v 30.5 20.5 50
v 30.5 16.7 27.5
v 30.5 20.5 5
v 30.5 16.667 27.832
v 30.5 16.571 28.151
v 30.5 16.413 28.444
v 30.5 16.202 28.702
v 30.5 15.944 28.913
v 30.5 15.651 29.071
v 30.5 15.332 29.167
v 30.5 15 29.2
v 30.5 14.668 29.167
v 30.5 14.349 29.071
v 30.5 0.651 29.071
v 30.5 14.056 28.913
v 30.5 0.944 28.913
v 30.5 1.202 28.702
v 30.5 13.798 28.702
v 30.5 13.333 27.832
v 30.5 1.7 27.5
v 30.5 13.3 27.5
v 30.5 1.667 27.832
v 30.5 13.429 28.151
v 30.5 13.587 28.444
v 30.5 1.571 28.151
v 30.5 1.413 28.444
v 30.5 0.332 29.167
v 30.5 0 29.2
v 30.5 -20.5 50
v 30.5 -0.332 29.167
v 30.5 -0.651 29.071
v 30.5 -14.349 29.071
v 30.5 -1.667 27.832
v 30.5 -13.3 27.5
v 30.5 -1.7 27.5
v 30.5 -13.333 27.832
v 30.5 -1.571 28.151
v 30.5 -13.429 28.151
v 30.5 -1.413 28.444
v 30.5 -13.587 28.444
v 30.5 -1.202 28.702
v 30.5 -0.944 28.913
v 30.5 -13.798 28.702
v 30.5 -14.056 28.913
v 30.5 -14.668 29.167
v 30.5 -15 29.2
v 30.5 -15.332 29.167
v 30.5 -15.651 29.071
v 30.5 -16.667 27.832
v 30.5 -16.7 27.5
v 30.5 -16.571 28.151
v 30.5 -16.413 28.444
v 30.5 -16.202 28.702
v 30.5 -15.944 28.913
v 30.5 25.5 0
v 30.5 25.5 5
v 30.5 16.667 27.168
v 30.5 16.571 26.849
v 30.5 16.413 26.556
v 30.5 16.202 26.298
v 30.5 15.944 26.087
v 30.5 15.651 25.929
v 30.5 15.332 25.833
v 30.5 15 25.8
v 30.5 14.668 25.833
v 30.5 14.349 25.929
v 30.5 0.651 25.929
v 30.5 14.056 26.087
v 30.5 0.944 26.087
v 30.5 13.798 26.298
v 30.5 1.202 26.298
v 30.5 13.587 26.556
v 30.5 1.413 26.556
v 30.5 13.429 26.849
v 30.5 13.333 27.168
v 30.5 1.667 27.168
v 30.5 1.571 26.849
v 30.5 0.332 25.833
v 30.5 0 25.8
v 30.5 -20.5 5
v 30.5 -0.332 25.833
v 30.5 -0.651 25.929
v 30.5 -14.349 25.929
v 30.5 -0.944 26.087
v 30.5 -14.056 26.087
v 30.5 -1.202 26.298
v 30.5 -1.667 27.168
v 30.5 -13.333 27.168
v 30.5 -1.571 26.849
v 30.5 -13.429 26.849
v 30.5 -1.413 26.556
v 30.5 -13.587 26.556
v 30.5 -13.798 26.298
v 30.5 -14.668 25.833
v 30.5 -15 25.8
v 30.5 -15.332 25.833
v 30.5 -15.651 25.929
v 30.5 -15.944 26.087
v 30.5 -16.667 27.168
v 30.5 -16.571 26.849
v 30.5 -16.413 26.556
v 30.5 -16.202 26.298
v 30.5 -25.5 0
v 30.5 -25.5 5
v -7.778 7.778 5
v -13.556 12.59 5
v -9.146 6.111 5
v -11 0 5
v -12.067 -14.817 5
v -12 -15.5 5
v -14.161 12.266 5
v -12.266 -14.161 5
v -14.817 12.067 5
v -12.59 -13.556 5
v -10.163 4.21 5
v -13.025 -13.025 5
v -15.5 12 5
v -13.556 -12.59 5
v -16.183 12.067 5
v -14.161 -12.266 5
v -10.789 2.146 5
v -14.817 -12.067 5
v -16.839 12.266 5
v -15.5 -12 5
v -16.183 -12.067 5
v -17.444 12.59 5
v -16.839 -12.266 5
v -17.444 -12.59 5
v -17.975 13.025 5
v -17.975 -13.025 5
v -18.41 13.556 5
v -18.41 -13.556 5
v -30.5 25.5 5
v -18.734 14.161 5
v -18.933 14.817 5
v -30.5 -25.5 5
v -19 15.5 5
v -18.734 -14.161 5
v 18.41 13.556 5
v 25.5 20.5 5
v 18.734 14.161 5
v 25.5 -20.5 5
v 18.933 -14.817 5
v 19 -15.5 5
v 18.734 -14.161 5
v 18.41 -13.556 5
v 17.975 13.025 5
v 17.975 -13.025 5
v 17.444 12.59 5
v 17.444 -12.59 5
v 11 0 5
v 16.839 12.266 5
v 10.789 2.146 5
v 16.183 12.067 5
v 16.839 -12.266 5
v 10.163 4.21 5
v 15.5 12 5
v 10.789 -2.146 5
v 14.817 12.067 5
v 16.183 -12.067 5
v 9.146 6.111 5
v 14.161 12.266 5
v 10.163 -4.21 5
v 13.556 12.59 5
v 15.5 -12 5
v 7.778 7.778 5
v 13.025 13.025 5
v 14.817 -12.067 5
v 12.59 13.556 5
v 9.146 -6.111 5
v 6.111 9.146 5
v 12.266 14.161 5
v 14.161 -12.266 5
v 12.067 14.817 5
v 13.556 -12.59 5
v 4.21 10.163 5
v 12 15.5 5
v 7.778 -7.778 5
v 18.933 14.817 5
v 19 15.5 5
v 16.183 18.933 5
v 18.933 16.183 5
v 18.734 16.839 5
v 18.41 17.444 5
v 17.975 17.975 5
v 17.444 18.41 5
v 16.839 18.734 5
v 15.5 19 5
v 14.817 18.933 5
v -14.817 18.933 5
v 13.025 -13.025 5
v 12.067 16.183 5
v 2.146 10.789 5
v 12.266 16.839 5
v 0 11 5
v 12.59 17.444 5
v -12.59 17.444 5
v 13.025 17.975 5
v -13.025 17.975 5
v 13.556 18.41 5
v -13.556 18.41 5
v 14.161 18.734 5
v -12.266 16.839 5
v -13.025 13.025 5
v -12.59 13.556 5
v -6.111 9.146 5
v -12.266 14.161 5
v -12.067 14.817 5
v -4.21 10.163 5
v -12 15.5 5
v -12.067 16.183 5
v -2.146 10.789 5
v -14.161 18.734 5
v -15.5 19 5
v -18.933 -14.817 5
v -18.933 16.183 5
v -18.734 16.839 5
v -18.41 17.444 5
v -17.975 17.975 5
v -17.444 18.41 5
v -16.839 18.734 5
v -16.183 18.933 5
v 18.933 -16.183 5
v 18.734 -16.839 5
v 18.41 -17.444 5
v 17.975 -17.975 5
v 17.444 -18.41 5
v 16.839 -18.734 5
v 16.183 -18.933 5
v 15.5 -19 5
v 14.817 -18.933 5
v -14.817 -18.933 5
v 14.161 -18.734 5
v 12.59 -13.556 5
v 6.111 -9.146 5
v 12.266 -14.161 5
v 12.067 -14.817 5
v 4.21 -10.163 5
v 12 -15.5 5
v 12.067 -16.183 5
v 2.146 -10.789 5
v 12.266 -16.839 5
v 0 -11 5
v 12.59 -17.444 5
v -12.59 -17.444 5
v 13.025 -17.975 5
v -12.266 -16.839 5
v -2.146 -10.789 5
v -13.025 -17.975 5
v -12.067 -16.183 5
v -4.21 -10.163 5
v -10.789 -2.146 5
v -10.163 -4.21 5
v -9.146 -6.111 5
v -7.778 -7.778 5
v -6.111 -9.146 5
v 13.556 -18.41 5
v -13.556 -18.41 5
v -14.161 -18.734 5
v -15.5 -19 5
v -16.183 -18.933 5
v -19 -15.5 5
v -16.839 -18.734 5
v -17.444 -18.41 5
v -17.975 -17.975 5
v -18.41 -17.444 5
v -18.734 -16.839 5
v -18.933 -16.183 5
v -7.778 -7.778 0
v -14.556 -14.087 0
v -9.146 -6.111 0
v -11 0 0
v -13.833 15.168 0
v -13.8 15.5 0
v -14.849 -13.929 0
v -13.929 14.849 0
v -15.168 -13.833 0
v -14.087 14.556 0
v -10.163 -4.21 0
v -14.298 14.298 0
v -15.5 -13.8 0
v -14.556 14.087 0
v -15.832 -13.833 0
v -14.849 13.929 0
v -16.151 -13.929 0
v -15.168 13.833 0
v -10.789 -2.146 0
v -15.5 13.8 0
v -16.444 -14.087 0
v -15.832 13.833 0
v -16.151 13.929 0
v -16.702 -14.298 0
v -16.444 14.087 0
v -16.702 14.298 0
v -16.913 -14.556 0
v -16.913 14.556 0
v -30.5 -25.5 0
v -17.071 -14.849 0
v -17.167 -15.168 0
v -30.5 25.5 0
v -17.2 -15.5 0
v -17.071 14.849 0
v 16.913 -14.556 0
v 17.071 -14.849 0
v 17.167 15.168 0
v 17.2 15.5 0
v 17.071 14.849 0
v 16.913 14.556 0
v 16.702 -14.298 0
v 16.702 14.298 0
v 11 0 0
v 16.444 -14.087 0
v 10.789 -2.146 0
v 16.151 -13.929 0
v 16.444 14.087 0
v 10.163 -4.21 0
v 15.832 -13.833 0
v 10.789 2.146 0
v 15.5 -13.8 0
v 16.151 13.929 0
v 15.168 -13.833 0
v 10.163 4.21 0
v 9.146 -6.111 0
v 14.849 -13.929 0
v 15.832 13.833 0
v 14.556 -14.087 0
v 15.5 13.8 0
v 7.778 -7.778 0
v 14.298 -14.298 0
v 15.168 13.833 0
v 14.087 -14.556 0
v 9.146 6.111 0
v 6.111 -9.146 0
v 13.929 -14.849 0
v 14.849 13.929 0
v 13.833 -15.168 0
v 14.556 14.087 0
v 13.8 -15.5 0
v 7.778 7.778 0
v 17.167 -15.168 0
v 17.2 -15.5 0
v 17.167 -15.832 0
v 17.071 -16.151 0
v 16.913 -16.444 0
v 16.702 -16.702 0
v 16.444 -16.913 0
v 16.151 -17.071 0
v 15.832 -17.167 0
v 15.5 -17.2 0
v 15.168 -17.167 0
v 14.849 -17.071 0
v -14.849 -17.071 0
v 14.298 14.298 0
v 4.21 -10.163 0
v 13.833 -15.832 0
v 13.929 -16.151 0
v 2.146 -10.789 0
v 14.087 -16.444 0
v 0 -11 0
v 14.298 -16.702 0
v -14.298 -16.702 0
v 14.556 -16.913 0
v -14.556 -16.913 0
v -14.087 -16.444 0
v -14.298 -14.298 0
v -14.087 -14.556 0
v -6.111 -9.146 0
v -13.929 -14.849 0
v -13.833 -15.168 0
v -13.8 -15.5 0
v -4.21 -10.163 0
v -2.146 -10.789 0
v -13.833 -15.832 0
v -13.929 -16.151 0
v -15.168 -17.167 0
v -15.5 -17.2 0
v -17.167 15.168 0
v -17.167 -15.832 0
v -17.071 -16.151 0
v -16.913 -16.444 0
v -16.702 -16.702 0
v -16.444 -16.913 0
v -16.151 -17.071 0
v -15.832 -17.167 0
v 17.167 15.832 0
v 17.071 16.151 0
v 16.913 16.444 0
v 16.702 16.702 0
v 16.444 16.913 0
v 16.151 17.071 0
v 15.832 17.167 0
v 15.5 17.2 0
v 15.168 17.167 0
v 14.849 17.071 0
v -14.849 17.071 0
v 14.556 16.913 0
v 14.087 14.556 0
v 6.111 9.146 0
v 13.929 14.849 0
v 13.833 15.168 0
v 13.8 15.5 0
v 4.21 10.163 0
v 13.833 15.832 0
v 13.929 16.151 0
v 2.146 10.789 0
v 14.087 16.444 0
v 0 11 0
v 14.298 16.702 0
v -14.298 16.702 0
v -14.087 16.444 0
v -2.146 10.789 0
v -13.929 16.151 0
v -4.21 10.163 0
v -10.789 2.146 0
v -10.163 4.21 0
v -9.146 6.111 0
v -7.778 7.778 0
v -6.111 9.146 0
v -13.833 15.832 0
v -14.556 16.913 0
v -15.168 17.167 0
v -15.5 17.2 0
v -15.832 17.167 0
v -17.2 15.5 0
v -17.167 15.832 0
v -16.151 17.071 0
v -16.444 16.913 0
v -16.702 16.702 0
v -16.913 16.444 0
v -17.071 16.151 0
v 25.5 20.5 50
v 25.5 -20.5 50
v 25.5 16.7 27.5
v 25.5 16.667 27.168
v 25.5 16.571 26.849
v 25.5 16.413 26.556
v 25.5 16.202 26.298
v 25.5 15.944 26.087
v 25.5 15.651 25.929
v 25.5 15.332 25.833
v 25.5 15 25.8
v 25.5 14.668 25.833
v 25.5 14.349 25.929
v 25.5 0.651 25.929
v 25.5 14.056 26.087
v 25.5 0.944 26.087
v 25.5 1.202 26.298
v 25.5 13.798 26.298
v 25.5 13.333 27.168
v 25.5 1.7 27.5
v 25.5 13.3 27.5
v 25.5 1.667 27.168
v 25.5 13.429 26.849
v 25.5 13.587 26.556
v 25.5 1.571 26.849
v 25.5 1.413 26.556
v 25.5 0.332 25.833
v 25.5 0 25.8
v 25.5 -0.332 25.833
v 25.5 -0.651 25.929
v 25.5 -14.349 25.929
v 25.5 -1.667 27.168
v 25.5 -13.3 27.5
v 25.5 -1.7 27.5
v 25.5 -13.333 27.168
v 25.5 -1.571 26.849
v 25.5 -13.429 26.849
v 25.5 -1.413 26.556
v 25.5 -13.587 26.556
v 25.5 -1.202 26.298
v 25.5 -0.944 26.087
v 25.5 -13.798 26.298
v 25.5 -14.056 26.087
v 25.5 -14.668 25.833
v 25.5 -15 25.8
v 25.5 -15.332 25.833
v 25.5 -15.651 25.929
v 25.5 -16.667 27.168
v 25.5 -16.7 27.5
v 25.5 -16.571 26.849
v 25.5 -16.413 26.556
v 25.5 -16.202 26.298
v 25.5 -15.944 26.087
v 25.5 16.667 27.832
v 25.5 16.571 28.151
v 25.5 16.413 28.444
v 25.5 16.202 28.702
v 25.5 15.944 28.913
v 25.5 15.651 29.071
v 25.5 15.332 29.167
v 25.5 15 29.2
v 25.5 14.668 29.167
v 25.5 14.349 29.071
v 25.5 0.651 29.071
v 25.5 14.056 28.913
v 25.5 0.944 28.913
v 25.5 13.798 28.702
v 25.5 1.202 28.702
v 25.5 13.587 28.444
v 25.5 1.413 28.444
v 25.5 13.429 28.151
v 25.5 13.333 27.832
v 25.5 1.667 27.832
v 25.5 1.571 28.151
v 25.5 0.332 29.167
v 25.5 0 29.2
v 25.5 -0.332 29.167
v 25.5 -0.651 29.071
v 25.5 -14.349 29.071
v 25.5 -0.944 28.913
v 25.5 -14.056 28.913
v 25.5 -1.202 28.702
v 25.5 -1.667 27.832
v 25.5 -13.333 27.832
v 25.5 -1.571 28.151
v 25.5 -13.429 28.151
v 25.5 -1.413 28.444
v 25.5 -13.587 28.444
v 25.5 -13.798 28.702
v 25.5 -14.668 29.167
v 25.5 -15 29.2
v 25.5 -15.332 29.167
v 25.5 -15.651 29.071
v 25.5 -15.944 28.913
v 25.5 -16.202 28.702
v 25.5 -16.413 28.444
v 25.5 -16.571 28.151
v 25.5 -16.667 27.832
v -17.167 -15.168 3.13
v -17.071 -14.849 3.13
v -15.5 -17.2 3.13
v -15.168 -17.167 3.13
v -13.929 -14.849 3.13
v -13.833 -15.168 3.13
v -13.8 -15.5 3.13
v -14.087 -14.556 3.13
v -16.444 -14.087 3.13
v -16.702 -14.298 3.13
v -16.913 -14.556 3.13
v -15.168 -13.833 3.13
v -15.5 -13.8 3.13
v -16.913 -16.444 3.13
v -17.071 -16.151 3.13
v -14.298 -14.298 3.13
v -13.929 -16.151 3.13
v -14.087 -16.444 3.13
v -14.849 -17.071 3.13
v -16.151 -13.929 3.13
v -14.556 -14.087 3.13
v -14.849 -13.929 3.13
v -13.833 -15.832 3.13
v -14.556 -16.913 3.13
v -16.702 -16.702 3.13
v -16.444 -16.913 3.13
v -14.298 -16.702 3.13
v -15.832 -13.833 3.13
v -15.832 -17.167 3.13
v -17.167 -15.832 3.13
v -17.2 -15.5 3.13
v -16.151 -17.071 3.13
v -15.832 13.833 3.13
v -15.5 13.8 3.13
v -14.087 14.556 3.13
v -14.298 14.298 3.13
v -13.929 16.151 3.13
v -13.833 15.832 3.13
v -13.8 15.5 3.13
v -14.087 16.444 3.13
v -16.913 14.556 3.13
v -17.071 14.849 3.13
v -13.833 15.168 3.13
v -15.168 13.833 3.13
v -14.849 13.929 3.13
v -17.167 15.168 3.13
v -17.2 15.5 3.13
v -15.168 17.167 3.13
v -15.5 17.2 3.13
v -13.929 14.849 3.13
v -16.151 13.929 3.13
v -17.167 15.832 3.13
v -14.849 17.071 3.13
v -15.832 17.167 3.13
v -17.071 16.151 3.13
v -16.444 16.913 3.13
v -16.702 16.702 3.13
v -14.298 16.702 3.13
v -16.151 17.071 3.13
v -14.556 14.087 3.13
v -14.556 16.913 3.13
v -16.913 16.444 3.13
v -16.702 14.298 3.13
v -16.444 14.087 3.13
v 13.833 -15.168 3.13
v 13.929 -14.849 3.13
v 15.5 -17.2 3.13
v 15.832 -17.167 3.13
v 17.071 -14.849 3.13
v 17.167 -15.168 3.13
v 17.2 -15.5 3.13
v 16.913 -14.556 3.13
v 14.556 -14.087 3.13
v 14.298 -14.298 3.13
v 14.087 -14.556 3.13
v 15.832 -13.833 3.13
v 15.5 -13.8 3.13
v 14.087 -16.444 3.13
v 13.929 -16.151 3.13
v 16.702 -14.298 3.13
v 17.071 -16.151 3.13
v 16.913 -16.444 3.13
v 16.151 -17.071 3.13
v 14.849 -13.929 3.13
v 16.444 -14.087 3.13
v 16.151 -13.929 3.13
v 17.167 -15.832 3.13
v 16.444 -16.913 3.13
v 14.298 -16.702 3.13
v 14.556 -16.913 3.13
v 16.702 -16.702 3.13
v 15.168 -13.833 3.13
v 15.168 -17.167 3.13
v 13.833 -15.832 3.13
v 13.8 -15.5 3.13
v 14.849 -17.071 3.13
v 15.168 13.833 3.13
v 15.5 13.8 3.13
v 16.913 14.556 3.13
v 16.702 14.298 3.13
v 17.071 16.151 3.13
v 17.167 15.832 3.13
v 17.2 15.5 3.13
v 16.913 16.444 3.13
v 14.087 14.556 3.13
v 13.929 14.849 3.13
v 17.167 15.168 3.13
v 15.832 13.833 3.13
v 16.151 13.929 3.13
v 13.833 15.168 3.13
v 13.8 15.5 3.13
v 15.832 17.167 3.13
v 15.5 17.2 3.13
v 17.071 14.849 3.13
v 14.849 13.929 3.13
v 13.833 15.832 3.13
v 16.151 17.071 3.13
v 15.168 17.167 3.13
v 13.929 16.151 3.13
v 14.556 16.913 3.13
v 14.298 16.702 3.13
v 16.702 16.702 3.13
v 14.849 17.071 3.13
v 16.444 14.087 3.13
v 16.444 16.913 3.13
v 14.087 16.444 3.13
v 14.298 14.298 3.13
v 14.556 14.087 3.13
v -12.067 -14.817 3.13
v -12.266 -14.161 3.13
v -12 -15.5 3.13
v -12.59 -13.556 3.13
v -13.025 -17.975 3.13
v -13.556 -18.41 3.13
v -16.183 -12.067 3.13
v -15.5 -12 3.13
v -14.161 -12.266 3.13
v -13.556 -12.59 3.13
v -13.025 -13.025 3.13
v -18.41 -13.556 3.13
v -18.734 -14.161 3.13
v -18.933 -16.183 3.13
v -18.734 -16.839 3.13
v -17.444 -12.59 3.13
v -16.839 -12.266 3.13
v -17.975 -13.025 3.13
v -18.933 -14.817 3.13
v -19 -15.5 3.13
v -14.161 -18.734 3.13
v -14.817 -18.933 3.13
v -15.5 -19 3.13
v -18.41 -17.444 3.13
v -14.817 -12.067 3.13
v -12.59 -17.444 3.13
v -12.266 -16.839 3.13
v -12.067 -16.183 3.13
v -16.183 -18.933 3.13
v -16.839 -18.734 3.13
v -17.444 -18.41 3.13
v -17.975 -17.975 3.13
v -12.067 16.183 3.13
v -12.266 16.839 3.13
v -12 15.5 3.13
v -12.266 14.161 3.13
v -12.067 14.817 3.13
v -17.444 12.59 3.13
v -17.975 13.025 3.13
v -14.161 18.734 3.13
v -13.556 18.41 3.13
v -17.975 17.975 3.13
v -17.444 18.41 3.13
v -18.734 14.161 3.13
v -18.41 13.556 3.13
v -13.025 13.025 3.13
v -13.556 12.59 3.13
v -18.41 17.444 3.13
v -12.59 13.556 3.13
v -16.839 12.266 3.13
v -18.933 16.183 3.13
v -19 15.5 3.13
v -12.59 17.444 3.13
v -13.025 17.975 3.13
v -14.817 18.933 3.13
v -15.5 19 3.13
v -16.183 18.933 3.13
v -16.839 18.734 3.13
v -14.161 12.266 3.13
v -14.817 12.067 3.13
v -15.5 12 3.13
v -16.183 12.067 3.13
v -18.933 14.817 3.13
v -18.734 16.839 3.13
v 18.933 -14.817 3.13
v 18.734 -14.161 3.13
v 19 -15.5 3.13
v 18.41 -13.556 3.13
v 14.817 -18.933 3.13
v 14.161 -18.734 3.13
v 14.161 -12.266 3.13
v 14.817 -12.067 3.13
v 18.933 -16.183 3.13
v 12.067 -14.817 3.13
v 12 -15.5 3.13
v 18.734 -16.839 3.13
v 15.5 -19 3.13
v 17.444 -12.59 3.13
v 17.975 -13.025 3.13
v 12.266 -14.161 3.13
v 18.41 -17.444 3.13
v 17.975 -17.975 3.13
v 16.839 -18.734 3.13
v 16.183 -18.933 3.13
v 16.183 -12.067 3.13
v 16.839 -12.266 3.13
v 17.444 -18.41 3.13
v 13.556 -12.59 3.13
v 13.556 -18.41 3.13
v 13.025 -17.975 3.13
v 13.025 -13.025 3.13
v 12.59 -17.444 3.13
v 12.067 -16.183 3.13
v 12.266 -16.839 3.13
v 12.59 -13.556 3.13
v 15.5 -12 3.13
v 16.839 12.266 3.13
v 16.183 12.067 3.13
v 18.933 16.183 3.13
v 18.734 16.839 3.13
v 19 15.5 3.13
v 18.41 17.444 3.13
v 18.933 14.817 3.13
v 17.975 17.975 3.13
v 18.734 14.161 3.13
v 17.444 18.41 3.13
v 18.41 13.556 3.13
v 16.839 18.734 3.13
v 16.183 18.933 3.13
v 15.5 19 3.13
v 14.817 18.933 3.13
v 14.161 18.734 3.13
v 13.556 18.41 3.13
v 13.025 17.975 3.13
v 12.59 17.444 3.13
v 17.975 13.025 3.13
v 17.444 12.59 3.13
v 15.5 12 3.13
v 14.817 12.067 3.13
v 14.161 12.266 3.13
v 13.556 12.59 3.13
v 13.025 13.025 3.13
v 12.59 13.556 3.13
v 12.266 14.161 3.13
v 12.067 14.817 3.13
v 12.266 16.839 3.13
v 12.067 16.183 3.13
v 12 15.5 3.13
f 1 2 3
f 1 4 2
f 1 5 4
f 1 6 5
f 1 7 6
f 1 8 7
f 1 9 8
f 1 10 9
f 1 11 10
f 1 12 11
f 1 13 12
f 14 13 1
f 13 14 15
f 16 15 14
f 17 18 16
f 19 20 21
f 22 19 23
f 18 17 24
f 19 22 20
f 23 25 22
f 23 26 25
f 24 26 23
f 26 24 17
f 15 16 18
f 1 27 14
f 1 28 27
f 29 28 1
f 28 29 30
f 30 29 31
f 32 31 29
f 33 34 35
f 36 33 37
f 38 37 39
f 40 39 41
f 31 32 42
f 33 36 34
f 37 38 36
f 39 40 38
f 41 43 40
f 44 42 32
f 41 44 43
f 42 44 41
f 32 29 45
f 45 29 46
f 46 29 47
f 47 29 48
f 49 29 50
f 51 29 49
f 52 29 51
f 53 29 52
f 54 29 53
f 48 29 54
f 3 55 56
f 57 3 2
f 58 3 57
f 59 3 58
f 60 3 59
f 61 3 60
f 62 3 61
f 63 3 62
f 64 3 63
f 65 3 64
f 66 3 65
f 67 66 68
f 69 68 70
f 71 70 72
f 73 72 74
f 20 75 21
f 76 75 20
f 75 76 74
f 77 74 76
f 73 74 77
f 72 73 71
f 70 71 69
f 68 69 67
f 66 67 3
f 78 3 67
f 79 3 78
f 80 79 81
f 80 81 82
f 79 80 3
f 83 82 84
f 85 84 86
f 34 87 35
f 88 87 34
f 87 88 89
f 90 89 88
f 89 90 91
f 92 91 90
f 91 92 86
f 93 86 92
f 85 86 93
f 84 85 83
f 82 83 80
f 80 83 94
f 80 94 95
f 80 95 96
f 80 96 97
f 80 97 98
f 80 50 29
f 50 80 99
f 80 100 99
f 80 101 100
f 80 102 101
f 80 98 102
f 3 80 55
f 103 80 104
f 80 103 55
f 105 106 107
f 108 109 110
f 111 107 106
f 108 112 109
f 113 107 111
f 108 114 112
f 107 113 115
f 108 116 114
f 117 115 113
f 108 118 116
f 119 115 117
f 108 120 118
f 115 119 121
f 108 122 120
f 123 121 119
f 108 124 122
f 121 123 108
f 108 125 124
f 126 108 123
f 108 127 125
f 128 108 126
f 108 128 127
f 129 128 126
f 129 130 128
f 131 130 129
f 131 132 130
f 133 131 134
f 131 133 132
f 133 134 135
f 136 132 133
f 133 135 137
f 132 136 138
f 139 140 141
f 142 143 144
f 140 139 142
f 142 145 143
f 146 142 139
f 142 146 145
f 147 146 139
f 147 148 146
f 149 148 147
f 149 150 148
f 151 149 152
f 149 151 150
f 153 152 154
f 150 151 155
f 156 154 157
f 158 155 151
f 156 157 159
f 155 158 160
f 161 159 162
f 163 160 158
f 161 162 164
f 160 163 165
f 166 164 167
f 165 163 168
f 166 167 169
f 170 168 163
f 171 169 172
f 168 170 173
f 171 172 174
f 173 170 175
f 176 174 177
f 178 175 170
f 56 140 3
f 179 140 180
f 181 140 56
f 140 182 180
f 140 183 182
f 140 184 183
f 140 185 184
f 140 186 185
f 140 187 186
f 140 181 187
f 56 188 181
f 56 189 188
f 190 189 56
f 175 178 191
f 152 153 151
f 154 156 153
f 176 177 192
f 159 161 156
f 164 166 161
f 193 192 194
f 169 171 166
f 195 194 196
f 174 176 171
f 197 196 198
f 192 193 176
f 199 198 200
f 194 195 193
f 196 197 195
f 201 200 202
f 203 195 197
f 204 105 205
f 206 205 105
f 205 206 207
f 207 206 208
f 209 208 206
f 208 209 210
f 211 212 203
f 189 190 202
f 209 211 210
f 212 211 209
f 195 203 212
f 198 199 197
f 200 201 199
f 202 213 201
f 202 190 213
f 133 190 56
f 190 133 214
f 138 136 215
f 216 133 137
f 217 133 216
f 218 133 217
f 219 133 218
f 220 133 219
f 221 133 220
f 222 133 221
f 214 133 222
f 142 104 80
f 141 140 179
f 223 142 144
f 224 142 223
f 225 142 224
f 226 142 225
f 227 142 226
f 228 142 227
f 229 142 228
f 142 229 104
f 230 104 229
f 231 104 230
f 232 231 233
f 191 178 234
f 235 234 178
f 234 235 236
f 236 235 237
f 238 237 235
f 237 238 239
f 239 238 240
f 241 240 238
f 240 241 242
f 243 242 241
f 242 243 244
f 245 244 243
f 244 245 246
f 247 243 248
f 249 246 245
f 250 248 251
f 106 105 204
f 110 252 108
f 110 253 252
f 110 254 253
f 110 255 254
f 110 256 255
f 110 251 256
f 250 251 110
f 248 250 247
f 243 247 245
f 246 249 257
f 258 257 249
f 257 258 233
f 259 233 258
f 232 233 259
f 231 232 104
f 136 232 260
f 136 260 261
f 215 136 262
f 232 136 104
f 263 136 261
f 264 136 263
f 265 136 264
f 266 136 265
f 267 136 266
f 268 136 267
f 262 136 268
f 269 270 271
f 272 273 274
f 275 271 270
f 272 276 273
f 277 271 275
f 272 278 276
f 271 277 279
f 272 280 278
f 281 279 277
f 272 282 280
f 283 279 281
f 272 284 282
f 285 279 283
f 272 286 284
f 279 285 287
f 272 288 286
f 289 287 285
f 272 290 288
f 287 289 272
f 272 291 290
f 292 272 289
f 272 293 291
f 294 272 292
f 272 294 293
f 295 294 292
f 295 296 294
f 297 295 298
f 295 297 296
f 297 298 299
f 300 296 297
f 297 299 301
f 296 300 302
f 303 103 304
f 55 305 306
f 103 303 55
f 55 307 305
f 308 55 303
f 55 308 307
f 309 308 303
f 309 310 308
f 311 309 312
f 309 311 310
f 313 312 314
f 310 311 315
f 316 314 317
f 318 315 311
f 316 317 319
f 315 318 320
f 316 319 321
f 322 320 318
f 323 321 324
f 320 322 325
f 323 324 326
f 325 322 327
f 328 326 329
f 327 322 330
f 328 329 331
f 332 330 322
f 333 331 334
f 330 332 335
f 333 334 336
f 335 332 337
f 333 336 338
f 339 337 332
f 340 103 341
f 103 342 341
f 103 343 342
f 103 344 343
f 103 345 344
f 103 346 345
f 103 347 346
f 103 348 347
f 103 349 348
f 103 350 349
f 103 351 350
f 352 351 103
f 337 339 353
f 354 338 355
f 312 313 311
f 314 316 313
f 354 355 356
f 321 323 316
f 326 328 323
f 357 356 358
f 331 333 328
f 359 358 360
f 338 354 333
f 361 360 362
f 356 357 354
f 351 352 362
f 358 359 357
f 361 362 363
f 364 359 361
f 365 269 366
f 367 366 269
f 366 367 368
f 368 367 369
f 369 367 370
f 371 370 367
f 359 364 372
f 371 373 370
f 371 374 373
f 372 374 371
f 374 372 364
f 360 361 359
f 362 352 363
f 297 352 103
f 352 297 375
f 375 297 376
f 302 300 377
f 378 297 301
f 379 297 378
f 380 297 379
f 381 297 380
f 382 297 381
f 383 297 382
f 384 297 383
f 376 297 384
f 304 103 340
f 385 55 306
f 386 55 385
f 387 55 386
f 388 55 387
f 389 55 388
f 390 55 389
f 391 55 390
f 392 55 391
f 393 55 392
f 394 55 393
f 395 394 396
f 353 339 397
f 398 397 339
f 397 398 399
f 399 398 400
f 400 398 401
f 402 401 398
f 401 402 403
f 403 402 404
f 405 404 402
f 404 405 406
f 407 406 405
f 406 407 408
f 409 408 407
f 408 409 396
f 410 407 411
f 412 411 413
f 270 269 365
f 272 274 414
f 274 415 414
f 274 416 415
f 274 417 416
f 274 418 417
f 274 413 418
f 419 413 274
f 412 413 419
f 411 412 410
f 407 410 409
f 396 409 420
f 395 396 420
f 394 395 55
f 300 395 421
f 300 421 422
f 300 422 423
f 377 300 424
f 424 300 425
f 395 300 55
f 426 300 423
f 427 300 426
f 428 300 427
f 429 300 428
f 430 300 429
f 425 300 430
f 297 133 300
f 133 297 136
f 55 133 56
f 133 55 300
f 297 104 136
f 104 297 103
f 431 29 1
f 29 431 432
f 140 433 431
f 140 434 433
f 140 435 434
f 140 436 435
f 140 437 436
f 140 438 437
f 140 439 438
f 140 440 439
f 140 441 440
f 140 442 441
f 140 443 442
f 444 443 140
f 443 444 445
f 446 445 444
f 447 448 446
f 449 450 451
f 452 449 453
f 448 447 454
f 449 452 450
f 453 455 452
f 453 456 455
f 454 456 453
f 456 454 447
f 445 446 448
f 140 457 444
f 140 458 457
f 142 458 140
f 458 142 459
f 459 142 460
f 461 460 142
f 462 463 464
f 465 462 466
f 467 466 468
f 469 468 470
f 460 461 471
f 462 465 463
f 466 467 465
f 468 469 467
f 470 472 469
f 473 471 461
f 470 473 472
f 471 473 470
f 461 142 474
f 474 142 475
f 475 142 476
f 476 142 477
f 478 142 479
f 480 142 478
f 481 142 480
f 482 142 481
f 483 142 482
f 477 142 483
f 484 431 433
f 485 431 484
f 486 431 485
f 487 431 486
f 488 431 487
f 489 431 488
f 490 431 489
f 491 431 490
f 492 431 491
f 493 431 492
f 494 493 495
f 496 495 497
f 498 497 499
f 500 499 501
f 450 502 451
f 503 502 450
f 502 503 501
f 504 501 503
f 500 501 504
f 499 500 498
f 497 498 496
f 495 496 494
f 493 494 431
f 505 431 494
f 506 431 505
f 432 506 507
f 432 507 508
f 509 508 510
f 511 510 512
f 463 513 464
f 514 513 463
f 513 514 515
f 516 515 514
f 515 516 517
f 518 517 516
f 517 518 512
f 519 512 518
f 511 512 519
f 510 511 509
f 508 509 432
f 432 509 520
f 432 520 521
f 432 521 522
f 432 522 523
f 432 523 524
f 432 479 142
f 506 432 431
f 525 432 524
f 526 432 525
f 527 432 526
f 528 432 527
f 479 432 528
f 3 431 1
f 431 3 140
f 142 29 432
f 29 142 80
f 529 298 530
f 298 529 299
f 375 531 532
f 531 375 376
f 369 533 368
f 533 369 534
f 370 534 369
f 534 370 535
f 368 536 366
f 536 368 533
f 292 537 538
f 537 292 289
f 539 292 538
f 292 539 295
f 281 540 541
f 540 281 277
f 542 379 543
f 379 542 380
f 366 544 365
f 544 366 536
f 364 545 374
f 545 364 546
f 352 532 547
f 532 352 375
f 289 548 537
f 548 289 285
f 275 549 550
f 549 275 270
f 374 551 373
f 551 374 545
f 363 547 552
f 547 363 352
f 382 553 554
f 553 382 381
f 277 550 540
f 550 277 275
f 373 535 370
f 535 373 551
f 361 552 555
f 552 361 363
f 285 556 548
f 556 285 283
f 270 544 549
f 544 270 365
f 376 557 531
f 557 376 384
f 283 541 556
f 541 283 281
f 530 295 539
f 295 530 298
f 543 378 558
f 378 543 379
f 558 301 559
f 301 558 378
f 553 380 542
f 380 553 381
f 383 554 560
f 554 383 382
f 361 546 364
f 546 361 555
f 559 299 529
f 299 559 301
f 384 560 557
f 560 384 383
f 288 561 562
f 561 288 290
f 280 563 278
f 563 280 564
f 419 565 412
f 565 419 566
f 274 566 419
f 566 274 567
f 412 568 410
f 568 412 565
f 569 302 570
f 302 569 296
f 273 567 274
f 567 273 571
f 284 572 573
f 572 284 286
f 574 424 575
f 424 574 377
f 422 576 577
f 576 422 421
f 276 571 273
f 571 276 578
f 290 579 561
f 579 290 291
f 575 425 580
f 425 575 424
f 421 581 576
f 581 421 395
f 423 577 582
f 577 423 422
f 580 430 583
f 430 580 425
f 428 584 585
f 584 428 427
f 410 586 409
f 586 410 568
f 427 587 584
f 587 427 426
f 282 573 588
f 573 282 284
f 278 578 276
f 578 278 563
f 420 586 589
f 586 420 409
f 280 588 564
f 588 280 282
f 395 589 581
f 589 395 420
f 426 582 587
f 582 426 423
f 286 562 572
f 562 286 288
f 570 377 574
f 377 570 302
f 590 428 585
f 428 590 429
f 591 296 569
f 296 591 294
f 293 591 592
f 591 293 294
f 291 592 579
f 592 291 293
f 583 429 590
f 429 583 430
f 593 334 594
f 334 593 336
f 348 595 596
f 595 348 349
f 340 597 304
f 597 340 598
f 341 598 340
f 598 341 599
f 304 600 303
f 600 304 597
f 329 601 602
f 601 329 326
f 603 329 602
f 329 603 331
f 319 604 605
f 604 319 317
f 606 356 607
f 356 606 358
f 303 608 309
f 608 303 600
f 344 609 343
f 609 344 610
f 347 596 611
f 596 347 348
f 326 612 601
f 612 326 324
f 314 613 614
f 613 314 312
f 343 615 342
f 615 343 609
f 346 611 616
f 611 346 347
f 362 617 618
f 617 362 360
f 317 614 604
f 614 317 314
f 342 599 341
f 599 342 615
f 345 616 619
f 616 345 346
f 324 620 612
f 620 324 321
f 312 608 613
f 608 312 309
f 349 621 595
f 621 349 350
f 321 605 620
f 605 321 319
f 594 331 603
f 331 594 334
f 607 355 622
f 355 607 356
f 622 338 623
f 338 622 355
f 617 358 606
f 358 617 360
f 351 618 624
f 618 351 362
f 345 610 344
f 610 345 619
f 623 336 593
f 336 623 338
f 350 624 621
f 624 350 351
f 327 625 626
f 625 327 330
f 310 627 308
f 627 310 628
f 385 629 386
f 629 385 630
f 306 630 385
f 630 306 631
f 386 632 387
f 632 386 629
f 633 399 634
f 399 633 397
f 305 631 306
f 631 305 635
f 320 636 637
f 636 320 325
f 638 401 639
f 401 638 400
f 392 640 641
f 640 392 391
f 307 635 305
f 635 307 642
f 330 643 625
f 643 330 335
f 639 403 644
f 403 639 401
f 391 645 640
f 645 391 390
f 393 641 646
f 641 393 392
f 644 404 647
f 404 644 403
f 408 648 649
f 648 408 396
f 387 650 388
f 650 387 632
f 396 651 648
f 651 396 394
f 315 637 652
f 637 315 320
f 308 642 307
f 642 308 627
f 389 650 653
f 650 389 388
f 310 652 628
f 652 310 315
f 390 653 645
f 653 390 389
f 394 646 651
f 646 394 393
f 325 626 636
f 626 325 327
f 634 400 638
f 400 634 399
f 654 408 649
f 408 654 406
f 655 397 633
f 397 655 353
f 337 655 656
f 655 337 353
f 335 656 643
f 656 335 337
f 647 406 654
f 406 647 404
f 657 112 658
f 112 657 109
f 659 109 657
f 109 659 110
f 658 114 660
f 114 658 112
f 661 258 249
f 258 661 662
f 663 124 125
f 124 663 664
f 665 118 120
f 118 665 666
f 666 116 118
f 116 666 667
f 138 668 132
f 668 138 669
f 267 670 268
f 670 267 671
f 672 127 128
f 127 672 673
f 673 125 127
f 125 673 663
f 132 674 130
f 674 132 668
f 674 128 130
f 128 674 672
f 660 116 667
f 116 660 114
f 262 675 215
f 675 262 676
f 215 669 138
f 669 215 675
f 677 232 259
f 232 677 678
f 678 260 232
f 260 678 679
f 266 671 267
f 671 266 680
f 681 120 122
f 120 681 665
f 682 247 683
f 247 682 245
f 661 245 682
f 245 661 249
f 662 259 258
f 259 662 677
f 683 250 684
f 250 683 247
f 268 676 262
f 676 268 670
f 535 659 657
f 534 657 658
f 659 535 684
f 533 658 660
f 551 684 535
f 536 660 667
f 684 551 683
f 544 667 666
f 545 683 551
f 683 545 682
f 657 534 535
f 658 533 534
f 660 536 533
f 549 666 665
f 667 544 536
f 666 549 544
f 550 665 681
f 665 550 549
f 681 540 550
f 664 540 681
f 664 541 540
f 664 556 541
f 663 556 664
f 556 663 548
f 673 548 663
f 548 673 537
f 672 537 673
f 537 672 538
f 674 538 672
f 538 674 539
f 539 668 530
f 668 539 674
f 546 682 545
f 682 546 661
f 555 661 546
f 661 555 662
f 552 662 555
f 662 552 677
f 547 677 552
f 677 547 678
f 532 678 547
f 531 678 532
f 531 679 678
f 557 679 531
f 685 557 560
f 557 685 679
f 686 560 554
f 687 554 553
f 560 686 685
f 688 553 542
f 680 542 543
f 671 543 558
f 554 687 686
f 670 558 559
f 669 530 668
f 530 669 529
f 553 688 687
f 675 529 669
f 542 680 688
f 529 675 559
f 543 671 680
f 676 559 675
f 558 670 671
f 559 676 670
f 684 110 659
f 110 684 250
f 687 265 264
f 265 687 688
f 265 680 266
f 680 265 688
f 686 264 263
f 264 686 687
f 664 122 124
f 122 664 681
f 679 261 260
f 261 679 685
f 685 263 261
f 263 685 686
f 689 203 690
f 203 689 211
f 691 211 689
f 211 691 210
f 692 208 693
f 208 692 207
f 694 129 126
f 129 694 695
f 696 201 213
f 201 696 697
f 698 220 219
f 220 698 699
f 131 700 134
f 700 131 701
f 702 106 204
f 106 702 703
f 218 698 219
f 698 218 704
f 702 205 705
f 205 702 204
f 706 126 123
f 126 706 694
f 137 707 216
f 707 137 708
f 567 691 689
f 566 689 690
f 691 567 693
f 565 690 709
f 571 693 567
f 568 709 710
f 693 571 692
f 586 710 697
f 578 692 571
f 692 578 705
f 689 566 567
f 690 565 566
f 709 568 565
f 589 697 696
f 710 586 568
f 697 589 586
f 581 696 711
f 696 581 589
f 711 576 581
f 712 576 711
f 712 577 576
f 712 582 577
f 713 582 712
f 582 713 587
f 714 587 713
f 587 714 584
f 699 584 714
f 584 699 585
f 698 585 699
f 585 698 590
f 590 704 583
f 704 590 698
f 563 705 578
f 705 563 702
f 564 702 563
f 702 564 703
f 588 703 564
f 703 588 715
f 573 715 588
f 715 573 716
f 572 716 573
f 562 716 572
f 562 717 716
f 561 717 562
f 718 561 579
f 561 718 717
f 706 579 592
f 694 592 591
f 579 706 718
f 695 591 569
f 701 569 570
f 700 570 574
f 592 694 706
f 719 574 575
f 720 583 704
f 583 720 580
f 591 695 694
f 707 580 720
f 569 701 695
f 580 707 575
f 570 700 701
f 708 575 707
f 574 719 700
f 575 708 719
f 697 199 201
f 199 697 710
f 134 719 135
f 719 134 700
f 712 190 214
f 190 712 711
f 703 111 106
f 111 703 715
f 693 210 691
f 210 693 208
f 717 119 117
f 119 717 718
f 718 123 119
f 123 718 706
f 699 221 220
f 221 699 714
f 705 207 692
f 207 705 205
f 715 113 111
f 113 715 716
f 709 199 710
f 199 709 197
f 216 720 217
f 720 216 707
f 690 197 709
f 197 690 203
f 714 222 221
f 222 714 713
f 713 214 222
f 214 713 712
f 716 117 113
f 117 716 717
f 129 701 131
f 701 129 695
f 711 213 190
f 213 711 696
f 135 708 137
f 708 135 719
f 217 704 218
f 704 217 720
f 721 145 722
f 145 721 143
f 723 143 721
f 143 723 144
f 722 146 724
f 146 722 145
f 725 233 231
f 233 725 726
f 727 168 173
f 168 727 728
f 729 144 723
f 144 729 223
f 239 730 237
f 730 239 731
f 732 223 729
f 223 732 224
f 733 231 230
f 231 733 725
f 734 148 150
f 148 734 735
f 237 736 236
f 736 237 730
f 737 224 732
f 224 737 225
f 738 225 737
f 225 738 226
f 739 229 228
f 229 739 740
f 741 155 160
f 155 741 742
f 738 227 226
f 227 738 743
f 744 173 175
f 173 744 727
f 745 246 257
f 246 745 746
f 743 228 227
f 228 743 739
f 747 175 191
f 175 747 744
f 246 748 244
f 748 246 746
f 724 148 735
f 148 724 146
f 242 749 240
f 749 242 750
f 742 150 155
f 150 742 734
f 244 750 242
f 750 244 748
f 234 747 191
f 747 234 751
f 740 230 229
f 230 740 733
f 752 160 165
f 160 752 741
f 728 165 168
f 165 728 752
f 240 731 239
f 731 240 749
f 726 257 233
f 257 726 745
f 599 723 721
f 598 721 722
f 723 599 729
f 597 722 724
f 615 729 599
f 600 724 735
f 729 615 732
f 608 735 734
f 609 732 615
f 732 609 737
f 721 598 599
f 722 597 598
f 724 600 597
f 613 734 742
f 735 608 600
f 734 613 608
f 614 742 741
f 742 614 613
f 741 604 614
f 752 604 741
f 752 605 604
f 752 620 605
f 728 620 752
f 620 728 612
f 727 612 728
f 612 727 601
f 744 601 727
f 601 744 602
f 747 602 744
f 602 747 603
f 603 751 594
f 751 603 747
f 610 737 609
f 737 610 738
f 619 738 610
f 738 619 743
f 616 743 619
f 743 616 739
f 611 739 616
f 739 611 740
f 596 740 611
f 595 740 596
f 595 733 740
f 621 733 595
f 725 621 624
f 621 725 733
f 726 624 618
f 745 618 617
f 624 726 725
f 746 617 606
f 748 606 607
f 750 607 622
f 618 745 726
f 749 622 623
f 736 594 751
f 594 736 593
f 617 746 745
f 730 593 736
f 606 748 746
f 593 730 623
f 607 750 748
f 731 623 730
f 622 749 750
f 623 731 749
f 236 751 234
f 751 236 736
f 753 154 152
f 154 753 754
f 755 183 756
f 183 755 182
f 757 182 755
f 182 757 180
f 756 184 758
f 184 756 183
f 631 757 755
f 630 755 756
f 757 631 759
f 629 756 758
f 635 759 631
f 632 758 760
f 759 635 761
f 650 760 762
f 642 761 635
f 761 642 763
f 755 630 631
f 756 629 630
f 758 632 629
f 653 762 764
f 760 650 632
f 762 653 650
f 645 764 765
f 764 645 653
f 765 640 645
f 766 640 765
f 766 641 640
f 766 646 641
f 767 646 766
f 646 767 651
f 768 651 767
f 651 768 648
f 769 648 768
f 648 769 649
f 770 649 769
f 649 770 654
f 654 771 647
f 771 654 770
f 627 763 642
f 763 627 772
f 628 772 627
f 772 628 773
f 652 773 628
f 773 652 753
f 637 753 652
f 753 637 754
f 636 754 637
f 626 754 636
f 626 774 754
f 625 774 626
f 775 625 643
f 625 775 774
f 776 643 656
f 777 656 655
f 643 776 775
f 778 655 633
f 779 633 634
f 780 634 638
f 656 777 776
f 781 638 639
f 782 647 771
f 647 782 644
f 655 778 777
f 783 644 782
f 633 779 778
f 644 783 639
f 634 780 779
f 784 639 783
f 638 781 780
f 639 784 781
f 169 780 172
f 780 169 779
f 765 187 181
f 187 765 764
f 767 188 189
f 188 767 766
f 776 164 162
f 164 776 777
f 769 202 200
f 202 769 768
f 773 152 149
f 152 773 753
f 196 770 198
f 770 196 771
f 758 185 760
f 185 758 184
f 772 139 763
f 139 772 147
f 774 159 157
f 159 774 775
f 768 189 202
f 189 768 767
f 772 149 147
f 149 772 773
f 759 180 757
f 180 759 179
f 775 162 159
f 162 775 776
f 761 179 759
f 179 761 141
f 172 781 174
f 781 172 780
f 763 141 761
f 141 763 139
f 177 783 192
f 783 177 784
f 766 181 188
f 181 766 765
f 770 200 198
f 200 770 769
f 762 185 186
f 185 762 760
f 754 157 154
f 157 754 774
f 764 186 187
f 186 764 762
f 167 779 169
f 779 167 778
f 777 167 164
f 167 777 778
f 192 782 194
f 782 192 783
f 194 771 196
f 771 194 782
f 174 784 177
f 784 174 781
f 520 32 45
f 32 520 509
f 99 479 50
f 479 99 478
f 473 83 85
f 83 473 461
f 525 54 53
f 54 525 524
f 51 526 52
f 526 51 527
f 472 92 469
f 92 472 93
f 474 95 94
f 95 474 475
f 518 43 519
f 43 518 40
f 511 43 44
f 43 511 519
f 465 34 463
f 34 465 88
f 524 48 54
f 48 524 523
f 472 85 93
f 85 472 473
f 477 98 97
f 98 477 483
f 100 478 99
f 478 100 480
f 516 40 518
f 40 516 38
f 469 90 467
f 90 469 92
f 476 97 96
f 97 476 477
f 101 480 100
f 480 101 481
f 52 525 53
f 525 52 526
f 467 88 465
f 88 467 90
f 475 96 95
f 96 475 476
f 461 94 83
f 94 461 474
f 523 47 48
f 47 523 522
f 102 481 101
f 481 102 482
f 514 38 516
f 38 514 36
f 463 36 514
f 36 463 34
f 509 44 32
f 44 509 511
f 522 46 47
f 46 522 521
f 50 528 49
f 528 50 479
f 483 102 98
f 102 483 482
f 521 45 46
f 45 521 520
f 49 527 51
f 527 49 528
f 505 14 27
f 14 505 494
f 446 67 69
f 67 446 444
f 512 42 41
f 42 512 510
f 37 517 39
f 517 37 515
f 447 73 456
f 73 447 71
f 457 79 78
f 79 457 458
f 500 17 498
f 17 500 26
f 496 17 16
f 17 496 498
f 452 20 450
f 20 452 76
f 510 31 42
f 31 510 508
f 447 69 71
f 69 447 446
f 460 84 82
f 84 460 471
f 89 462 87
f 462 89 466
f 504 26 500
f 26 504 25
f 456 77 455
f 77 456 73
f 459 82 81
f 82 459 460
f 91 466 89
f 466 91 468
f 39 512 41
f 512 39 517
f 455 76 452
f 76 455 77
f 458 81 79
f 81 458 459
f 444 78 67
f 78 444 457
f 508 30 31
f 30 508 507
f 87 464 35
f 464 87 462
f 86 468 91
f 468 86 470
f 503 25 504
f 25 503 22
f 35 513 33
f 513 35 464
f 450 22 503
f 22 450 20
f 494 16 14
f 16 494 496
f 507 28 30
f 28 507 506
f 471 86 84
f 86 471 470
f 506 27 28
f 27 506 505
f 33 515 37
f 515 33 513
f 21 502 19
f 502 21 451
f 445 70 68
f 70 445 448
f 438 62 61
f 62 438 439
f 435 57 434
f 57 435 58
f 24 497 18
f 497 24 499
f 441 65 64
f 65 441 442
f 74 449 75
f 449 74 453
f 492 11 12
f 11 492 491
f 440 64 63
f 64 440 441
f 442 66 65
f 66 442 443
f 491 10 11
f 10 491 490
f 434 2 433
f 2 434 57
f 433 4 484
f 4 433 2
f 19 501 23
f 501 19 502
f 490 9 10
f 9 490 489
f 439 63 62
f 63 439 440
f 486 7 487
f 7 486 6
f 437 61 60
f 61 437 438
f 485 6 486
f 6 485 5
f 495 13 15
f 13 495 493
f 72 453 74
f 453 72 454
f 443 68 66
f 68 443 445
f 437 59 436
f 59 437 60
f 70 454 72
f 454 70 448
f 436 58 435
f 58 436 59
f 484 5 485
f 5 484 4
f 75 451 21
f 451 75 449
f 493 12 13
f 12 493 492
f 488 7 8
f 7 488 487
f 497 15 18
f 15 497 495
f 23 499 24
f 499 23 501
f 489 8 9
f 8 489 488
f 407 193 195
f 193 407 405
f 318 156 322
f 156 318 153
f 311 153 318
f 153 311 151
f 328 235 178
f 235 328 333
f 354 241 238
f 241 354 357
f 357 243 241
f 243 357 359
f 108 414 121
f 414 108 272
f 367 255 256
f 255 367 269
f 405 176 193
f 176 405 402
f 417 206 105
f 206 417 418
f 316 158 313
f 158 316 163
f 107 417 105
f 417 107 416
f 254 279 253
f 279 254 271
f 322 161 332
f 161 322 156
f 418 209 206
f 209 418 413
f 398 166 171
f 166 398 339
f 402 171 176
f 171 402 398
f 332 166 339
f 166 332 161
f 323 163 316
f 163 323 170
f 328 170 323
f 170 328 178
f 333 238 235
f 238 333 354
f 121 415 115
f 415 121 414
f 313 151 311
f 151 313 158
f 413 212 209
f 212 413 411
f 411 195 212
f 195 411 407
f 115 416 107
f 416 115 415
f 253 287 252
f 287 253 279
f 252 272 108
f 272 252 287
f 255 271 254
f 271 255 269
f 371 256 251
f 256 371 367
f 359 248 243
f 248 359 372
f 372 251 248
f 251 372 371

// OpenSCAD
$fn = 32;

// ----------------------------------------------------------------------
// Motor mount plate: NEMA17, 61 x 51 x 55 mm
// ----------------------------------------------------------------------

// --- parameters (mm) ---
base_x = 61;              // plate length, X
base_y = 51;              // plate width, Y
thick = 5;                // plate thickness
bolt_pitch = 31;          // NEMA17 bolt spacing
motor_d = 3.4;            // NEMA17 screw clearance
boss_hole = 22;           // pilot boss bore
cb_d = 7;                 // counterbore seat
cb_h = 1.87;              // counterbore depth
second_d = 3.4;           // second fastener hole
wall_h = 50;              // upright height
wall_t = 5;               // upright thickness

module plate() {
  translate([-base_x / 2, -base_y / 2, 0]) cube([base_x, base_y, thick]);
}

module motor_holes() {
  for (sx = [-1, 1]) for (sy = [-1, 1])
    translate([sx * bolt_pitch / 2, sy * bolt_pitch / 2, -1])
      cylinder(h = thick + 2, d = motor_d);
}
module motor_counterbores() {
  for (sx = [-1, 1]) for (sy = [-1, 1])
    translate([sx * bolt_pitch / 2, sy * bolt_pitch / 2, thick - cb_h])
      cylinder(h = cb_h + 0.6, d = cb_d);
}
module upright() {
  /* wall sunk 1 mm into the plate for a positive overlap */
  translate([base_x / 2 - wall_t, -base_y / 2 + wall_t, thick - 1])
    cube([wall_t, base_y - 2 * wall_t, wall_h - thick + 1]);
}

difference() {
  union() {
    plate();
    upright();
  }
  motor_holes();
  translate([0, 0, -1]) cylinder(h = thick + 2, d = boss_hole);
  motor_counterbores();
  for (i = [0 : 2])
    translate([base_x / 2 - wall_t - 1, (i - 1) * wall_h * 0.3, thick + wall_h * 0.45]) rotate([0, 90, 0]) cylinder(h = wall_t + 2, d = second_d);
}
